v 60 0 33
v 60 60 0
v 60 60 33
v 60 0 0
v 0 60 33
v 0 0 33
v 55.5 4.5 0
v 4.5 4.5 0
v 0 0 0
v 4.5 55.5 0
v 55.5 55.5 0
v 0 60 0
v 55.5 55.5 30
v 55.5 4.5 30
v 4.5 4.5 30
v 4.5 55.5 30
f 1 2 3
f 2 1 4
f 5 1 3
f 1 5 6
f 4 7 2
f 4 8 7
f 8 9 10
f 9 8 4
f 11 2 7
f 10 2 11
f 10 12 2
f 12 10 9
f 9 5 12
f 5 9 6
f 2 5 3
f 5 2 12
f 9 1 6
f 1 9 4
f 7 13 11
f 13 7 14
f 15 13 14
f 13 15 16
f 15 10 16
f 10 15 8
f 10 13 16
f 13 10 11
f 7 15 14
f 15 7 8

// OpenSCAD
difference(){

cube([60,60,33]);
    translate([4.5,4.5,0])
cube([51,51,30]);
}
